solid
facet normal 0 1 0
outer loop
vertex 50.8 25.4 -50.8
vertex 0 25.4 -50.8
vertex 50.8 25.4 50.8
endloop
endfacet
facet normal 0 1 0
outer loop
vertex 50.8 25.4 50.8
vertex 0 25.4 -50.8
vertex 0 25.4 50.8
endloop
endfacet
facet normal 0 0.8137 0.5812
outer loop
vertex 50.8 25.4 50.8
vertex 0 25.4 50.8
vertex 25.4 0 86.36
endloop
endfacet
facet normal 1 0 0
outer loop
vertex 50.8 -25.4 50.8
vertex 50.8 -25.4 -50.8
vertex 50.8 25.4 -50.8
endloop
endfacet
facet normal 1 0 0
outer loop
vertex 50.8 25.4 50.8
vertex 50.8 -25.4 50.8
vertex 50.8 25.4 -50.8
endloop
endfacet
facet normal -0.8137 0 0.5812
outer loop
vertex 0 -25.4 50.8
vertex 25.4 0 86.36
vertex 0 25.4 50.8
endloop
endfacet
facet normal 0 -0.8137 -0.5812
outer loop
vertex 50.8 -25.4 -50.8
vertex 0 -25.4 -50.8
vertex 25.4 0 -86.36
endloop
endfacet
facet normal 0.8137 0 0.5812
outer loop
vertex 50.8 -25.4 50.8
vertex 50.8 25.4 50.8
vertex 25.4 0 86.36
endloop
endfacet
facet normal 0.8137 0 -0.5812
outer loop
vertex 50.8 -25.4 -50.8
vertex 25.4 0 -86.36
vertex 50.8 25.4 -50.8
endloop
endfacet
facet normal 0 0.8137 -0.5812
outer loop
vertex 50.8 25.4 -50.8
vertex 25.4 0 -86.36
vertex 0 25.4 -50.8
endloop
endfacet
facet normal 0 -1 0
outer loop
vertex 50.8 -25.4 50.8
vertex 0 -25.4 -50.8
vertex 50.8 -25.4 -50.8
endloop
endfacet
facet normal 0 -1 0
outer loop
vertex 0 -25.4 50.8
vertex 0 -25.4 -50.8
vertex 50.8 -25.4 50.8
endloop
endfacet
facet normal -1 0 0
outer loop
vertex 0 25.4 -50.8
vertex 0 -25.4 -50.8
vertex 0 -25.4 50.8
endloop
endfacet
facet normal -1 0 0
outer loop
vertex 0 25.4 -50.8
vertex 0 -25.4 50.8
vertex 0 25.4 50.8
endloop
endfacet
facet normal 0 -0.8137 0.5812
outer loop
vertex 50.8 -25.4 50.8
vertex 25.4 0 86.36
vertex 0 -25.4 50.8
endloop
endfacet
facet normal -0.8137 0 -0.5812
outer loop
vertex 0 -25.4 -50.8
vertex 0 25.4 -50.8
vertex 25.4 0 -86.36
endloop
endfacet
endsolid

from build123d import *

# Parameters (mm, degrees)
F0_W     = 50.8
F0_H     = 101.6
F1_DEPTH = 50.8
F3_DEPTH = 50.8
F5_DEPTH = 50.8


with BuildPart() as f1:
    # F0 (on Right) → F1 (new body)
    with BuildSketch(Plane.YZ):
        Polygon((0, 86.36), (-25.4, 50.8), (25.4, 50.8), align=None)
        Rectangle(F0_W, F0_H)
        Polygon((25.4, -50.8), (-25.4, -50.8), (0, -86.36), align=None)
    extrude(amount=F1_DEPTH)

    # F2 (on face) → F3 (cut)
    with BuildSketch(Plane(origin=(0, 25.4, 0), x_dir=(-1, 0, 0), z_dir=(0, 1, 0))):
        Polygon((-50.8, 86.36), (-50.8, 50.8), (-25.4, 86.36), align=None)
        Polygon((-25.4, 86.36), (0, 50.8), (0, 86.36), align=None)
    extrude(amount=-F3_DEPTH, mode=Mode.SUBTRACT)

    # F4 (on face) → F5 (cut)
    with BuildSketch(Plane(origin=(0, 25.4, 0), x_dir=(-1, 0, 0), z_dir=(0, 1, 0))):
        Polygon((0, -86.36), (0, -50.8), (-25.4, -86.36), align=None)
        Polygon((-25.4, -86.36), (-50.8, -50.8), (-50.8, -86.36), align=None)
    extrude(amount=-F5_DEPTH, mode=Mode.SUBTRACT)


solid = f1.part
